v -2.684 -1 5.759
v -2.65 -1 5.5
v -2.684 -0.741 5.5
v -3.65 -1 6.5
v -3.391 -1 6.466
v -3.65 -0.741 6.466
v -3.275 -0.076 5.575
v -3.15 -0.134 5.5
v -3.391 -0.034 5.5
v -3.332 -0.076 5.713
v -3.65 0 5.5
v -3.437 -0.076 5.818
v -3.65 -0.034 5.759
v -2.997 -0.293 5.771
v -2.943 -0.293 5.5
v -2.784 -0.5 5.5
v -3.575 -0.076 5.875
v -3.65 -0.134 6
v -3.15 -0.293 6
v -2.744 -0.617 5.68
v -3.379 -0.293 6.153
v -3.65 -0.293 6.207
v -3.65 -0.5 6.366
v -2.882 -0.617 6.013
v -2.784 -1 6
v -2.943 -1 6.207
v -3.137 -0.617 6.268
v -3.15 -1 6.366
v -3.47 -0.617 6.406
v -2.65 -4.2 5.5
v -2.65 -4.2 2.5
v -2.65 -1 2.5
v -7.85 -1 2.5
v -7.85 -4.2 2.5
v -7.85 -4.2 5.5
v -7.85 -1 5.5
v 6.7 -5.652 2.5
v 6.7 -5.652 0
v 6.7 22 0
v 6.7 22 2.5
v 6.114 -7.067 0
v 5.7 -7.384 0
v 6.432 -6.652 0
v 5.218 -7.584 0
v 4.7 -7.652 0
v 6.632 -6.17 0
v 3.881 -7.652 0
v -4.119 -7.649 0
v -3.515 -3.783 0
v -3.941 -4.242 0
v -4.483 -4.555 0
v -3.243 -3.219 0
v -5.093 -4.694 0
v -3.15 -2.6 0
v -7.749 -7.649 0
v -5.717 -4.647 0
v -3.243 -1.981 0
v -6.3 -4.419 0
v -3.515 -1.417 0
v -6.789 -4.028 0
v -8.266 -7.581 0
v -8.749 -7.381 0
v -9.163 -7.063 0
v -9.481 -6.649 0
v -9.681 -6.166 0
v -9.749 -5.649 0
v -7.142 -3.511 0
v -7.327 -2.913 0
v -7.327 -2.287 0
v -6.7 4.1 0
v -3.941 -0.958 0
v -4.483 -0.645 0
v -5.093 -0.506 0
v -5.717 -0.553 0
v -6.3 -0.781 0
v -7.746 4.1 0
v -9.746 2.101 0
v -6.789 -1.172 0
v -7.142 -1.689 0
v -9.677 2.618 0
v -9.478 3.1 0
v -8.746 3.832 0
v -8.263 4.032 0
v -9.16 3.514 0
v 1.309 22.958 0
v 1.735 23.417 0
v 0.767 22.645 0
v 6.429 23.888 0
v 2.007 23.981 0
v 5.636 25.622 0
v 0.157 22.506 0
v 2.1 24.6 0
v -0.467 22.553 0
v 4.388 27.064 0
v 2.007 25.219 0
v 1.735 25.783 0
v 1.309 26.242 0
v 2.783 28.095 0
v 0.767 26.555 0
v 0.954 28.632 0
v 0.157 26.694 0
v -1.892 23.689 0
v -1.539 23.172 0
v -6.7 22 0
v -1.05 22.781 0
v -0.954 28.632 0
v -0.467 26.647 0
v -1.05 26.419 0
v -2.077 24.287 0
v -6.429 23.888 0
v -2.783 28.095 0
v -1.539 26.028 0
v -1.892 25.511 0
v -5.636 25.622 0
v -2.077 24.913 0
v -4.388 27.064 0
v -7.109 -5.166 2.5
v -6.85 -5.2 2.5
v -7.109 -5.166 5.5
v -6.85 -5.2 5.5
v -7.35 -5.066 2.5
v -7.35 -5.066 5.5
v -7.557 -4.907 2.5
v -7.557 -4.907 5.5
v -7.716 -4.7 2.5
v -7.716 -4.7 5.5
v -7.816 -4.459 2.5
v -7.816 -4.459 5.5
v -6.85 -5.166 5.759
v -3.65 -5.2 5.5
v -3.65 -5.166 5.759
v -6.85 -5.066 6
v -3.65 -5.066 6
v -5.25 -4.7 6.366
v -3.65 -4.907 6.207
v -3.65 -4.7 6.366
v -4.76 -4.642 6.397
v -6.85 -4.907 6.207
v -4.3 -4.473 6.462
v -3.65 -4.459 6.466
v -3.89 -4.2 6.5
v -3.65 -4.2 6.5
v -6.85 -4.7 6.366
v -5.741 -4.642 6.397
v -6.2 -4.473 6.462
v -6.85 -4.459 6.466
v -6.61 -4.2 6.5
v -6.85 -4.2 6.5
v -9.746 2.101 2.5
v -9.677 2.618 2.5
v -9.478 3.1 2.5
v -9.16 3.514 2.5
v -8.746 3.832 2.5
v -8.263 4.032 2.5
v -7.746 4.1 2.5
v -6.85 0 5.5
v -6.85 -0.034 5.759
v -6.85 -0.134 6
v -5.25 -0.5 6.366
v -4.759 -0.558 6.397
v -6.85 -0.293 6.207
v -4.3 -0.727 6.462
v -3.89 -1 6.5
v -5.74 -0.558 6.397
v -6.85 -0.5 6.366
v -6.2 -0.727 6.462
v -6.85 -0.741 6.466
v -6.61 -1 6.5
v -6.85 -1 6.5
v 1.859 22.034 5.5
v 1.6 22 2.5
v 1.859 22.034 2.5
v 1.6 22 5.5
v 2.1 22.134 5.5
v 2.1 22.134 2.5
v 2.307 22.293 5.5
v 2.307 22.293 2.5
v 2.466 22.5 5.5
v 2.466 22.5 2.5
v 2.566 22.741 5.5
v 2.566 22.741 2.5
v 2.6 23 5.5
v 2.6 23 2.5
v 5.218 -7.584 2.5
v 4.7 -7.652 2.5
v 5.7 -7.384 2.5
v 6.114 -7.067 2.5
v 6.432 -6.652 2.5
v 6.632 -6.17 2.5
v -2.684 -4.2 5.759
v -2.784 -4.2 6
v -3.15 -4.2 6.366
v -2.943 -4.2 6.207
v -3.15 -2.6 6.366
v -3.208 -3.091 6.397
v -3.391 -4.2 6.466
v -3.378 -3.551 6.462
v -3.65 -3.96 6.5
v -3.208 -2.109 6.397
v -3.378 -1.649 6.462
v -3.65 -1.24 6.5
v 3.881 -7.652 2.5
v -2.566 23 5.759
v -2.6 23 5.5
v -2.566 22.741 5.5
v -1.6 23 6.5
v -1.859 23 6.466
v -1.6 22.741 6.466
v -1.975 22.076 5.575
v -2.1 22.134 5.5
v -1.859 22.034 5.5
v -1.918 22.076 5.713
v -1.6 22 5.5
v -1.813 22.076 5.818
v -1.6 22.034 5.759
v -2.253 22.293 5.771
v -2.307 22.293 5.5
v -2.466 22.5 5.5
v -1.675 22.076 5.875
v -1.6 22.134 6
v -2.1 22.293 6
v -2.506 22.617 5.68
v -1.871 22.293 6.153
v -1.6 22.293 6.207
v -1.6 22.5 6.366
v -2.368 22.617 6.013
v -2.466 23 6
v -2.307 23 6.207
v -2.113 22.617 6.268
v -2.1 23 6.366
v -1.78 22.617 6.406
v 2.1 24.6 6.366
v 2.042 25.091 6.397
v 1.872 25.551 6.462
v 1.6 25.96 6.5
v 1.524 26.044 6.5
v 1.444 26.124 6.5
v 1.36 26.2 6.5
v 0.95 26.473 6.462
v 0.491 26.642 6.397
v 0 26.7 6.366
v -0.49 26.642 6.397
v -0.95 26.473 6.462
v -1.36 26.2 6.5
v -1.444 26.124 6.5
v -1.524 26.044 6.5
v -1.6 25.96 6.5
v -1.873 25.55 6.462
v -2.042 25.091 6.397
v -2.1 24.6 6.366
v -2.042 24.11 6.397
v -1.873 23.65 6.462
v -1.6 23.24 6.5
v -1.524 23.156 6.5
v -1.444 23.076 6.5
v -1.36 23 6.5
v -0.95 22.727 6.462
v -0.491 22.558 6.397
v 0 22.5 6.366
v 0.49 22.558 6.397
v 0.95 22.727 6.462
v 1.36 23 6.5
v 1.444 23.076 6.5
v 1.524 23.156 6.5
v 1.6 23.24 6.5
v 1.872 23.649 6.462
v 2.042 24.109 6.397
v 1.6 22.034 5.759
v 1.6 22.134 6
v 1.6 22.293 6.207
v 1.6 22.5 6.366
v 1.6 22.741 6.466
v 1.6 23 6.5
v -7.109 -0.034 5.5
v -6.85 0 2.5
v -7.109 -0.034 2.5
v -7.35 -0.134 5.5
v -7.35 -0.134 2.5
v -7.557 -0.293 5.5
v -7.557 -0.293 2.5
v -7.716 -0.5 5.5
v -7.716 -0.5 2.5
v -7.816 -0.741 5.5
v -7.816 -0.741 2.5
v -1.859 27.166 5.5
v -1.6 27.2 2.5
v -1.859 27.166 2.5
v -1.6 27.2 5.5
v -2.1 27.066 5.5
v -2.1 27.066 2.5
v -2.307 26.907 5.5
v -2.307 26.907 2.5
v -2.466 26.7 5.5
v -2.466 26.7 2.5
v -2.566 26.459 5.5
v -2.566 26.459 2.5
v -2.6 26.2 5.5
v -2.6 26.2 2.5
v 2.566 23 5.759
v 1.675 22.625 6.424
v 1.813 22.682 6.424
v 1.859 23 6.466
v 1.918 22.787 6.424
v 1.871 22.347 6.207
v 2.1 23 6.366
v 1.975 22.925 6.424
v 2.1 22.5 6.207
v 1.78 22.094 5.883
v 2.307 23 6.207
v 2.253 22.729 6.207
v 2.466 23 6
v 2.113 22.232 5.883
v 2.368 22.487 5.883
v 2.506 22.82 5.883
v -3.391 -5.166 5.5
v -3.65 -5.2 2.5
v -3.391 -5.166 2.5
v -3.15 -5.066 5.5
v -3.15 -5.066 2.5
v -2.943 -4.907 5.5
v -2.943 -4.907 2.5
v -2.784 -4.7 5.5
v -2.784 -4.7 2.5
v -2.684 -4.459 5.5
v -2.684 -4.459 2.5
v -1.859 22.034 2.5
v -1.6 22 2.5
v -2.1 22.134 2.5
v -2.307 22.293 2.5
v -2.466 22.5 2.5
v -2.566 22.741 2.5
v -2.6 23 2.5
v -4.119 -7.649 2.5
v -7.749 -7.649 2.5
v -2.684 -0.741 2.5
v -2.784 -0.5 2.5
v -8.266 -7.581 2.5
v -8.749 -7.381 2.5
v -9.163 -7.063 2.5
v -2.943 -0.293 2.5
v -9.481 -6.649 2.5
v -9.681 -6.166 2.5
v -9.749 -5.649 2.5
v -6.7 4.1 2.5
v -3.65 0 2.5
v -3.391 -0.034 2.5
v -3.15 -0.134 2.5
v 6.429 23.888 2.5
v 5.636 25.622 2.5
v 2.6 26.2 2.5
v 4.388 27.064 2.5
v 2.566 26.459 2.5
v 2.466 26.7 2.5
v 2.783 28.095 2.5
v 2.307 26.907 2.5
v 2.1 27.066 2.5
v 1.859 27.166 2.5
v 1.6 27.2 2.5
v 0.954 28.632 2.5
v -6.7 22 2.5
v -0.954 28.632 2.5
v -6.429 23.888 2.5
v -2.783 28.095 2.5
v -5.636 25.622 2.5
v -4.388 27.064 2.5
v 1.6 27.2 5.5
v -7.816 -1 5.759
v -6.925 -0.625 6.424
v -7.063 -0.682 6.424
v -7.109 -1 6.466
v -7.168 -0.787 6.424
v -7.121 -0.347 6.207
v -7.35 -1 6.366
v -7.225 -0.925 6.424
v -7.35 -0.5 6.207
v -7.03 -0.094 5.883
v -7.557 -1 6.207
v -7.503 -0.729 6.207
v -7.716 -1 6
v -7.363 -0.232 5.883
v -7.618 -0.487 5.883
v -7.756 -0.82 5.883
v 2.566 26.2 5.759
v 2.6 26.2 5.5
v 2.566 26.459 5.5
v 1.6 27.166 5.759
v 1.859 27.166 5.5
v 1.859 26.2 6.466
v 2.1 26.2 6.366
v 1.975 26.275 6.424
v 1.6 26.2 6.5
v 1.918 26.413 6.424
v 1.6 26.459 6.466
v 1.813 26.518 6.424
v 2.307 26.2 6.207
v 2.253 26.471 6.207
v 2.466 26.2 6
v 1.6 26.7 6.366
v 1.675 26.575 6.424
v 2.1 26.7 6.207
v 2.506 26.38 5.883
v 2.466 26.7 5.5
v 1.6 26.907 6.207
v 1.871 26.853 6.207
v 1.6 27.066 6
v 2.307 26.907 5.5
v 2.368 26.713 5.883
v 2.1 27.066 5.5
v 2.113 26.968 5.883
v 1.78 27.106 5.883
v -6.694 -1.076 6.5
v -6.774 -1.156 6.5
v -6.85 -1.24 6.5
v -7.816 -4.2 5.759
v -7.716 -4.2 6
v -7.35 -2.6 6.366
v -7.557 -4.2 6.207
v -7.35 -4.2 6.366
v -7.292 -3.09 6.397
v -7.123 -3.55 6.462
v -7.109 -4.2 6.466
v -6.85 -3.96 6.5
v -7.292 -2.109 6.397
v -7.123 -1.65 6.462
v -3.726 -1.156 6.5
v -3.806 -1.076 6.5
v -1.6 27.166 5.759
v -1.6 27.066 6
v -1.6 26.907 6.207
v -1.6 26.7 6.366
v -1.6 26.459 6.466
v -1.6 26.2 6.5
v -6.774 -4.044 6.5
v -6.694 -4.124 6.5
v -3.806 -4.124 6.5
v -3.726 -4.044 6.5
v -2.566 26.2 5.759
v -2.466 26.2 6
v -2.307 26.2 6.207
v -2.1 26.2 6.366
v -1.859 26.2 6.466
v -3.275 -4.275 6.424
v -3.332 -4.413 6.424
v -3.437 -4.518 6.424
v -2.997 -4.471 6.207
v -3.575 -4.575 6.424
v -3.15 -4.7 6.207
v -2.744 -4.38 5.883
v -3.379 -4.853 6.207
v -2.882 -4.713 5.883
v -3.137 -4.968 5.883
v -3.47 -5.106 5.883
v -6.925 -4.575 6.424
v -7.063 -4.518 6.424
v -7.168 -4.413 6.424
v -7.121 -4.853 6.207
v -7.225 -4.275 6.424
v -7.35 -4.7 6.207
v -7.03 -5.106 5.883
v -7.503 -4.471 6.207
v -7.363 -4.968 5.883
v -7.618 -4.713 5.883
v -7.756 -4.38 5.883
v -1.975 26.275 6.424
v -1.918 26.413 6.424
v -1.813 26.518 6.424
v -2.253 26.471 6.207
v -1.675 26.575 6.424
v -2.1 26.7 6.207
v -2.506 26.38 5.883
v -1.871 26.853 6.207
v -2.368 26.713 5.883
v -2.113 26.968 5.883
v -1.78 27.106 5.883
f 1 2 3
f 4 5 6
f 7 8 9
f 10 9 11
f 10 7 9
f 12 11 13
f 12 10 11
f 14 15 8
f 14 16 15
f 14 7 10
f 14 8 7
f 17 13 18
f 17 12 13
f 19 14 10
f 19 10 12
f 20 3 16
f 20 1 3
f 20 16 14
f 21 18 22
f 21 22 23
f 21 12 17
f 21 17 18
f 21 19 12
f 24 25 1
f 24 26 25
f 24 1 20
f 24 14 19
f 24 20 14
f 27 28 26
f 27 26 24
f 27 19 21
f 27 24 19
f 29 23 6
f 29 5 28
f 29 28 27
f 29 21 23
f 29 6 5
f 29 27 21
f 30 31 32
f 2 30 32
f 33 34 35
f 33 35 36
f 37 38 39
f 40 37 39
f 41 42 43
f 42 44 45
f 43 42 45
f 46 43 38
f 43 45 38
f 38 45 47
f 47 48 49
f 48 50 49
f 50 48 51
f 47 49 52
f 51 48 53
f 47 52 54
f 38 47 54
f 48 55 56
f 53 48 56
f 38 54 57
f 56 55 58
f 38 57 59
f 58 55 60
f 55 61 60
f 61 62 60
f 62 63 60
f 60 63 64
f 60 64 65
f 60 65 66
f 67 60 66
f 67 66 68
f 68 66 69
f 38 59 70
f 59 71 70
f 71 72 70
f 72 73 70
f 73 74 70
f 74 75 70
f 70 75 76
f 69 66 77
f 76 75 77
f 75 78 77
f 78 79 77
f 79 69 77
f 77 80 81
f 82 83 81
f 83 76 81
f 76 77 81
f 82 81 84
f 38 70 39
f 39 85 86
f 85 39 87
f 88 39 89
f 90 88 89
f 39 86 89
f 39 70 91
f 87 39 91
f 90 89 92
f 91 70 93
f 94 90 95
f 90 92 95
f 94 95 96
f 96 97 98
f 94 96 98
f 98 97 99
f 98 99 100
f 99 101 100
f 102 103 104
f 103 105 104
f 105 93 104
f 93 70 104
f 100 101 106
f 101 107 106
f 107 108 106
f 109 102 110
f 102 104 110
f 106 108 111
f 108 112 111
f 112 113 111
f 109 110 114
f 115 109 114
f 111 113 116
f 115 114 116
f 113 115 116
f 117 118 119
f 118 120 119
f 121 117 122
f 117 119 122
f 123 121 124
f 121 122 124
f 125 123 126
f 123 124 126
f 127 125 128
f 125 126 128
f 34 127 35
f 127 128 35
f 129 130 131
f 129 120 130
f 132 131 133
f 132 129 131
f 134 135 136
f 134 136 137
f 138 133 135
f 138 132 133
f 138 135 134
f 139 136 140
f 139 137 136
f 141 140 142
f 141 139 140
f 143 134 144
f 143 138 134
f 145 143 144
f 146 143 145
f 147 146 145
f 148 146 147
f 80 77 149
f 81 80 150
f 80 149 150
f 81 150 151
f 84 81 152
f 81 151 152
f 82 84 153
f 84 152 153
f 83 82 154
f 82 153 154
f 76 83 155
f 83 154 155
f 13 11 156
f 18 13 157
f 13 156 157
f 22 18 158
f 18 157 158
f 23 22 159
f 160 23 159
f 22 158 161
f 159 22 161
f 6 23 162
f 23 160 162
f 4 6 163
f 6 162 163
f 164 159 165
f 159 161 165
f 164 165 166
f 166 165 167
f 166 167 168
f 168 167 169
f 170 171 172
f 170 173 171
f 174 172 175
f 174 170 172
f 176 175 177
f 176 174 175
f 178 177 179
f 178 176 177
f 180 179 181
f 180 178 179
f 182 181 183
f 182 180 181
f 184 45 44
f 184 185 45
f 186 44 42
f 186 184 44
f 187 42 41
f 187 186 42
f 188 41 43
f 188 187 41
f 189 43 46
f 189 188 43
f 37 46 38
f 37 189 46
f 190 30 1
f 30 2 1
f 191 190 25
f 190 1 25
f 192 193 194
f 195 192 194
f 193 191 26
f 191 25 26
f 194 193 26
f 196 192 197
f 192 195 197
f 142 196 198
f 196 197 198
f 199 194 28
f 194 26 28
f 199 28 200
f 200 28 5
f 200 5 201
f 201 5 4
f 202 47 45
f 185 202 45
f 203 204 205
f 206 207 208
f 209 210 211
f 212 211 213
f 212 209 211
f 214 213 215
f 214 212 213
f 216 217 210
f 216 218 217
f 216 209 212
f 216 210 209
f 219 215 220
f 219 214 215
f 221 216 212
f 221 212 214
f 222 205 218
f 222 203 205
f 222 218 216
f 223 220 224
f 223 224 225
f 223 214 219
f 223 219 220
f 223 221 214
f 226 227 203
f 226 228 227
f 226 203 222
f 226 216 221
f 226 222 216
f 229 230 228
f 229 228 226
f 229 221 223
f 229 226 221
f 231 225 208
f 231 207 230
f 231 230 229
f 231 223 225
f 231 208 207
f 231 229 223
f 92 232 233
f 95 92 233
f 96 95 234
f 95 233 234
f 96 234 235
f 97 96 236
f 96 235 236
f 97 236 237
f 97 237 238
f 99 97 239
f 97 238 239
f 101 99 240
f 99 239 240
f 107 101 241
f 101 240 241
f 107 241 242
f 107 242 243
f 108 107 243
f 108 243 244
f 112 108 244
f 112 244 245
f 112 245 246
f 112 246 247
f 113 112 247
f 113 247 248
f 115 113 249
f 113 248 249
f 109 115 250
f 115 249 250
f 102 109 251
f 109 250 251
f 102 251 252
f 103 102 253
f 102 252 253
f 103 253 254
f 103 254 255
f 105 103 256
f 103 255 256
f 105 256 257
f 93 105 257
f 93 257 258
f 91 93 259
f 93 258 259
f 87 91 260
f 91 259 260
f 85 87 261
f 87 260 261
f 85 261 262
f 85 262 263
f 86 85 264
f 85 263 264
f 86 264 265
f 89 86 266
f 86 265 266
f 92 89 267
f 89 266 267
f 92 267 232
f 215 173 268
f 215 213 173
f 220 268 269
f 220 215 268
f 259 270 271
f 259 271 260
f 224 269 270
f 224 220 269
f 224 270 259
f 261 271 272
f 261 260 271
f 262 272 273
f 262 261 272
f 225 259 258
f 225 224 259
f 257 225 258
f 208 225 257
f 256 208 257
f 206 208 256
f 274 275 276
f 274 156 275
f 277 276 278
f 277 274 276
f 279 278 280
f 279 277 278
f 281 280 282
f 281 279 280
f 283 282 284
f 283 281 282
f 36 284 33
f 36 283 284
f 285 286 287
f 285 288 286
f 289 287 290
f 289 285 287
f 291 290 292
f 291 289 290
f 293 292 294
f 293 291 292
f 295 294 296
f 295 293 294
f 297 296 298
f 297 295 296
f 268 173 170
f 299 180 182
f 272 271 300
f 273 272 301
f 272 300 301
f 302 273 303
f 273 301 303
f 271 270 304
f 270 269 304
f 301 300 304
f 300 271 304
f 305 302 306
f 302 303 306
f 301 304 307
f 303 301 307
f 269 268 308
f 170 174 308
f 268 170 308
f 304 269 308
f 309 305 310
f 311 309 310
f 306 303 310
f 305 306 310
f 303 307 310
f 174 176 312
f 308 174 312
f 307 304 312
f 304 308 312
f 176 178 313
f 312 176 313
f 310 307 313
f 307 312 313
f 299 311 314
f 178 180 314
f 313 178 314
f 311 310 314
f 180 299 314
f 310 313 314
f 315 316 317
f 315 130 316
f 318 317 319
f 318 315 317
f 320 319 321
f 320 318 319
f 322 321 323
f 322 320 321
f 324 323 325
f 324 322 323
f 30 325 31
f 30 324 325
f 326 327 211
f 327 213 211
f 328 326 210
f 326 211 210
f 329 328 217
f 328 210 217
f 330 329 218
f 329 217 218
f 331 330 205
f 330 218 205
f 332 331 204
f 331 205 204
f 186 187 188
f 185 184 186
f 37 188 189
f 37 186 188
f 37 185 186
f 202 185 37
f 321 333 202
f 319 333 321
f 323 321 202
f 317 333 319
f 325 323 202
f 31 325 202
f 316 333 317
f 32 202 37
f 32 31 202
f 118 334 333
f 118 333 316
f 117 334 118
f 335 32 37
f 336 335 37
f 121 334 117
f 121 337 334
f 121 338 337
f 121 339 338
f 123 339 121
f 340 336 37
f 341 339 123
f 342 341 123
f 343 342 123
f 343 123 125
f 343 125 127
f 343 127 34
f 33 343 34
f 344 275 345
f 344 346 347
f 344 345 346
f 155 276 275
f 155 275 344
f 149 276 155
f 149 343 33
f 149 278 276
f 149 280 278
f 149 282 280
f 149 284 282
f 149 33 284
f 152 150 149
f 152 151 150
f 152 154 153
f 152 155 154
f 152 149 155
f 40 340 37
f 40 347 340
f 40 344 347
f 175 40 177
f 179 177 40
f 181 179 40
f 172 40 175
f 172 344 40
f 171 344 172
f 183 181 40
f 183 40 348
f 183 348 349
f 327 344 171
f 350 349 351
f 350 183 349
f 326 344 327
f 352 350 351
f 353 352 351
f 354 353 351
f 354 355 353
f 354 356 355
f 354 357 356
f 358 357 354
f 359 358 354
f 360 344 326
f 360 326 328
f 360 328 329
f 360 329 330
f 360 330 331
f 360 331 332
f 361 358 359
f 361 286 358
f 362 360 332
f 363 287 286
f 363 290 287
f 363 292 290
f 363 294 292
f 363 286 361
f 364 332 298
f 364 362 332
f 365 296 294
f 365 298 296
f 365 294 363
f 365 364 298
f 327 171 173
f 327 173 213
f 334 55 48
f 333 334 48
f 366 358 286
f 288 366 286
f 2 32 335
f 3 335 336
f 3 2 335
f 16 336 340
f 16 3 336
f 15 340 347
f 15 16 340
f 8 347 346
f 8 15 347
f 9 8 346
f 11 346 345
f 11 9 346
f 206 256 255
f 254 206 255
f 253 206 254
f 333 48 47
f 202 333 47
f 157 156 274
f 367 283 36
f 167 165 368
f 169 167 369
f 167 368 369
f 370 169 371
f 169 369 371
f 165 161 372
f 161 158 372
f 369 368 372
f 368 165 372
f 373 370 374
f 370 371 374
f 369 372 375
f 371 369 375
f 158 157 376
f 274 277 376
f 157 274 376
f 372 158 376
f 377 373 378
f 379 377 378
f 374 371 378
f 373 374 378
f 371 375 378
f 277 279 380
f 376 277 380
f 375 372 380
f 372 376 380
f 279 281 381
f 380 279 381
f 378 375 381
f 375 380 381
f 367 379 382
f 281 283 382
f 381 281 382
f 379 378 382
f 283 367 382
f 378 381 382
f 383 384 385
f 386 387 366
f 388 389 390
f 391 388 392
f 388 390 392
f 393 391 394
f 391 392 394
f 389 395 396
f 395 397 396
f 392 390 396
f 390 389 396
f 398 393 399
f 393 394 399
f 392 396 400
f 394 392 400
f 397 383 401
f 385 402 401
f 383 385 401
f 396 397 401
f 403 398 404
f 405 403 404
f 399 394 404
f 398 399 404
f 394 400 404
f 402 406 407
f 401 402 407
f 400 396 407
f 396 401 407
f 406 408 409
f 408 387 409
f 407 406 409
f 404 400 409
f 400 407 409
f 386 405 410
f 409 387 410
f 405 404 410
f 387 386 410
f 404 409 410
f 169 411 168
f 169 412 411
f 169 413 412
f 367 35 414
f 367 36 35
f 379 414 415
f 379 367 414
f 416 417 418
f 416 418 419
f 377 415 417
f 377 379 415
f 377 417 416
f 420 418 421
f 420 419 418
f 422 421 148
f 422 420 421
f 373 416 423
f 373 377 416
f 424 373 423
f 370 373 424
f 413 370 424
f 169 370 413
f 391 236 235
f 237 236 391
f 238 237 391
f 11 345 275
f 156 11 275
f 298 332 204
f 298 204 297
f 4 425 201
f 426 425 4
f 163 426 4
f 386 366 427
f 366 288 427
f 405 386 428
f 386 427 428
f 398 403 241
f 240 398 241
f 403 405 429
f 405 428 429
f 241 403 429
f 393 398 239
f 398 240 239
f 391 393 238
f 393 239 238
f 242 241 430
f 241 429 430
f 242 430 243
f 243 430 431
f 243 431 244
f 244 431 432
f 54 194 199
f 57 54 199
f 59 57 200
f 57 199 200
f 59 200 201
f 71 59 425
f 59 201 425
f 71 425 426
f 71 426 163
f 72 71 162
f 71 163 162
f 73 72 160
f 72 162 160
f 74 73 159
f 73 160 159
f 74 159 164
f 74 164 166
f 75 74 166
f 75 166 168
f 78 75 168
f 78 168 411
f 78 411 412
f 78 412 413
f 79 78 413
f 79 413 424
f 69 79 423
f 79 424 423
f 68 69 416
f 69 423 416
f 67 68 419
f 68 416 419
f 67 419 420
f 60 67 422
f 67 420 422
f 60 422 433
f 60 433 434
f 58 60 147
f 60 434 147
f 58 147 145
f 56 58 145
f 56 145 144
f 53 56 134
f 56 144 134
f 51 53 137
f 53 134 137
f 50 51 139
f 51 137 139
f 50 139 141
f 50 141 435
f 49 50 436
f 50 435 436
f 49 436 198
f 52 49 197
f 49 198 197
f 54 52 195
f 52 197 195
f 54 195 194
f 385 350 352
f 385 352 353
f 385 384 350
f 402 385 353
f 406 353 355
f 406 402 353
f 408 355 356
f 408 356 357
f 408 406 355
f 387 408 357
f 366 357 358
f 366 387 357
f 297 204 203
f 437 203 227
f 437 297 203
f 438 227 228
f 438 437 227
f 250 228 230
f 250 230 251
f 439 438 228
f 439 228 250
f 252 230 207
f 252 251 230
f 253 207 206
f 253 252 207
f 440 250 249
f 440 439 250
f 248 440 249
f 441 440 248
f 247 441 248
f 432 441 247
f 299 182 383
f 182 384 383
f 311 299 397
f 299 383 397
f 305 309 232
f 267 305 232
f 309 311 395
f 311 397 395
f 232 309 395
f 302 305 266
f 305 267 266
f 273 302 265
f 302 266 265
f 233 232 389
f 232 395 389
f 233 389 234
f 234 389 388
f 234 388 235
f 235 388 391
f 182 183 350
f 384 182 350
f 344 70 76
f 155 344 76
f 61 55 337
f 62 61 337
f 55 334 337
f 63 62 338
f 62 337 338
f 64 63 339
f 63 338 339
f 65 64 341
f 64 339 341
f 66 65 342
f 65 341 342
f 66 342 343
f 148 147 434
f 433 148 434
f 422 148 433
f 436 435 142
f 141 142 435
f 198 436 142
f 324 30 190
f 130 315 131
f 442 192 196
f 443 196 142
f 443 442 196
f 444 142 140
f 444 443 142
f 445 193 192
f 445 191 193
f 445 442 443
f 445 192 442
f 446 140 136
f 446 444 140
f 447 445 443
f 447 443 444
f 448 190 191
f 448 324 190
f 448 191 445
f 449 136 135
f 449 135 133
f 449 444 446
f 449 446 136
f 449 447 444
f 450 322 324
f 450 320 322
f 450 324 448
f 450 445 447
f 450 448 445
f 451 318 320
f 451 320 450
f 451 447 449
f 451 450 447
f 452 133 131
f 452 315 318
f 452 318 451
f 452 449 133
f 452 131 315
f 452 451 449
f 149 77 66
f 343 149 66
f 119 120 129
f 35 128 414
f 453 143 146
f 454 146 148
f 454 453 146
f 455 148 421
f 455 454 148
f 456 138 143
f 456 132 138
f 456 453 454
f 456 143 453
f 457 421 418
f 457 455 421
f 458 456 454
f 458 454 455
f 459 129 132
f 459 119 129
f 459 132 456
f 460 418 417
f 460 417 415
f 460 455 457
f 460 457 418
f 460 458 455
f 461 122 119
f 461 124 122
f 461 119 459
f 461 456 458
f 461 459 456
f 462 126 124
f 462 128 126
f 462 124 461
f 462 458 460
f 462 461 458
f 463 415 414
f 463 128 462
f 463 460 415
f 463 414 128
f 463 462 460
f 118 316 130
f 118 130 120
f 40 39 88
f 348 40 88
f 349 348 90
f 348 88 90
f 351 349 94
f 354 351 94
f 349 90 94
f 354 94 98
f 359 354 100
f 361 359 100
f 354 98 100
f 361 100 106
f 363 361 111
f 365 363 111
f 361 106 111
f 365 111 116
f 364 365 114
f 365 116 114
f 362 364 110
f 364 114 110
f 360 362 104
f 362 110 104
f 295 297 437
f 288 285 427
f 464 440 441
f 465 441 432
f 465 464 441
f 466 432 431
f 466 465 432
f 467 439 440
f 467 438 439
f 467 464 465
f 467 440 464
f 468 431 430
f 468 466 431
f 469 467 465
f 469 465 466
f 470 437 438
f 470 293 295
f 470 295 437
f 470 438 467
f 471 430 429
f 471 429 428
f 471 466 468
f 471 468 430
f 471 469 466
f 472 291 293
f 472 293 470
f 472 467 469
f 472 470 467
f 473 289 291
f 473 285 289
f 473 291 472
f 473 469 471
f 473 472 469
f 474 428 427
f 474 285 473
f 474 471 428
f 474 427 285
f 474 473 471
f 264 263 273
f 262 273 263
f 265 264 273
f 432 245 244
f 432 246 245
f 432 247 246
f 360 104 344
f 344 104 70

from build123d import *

# Parameters (mm, degrees)
BOSS_EXTRUDE1_DEPTH = 2.5
SKETCH1_3_W         = 5.2
SKETCH1_3_H         = 5.2
BOSS_EXTRUDE2_DEPTH = 6.5
FILLET1_R           = 2
FILLET2_R           = 1
SKETCH2_R           = 2.1
CUT_EXTRUDE1_DEPTH  = 7.5


with BuildPart() as part:
    # Sketch1 → Boss-Extrude1 (new body)
    with BuildSketch(Plane(origin=(0, 0, 0), x_dir=(0, 1, 0), z_dir=(0, 0, 1))):
        with BuildLine():
            Line((-7.649421348, 9.749384529), (-7.649421348, 4.119353309))
            Line((-7.649421348, 4.119353309), (-7.652407104, -3.880646133))
            Line((-7.652407104, -3.880646133), (-7.652407104, -6.7))
            Line((-7.652407104, -6.7), (22, -6.7))
            ThreePointArc((22, -6.7), (28.7, 0), (22, 6.7))
            Line((22, 6.7), (4.1, 6.7))
            Line((4.1, 6.7), (4.1, 9.744999415))
            Line((4.1, 9.744999415), (-7.649421348, 9.749384529))
        make_face()
    extrude(amount=BOSS_EXTRUDE1_DEPTH)

    # Sketch1<3> → Boss-Extrude2 (add)
    with BuildSketch(Plane(origin=(0, 0, 0), x_dir=(0, 1, 0), z_dir=(0, 0, 1))):
        with Locations((24.6, 0)):
            Rectangle(SKETCH1_3_W, SKETCH1_3_H)
        with Locations((-2.6, 5.25)):
            Rectangle(SKETCH1_3_W, SKETCH1_3_H)
    extrude(amount=BOSS_EXTRUDE2_DEPTH)

    # Fillet1
    fillet1_edges = [part.edges().sort_by_distance(p)[0] for p in [
        (6.7, -7.652407104, 1.25),
        (-9.749384529, -7.649421348, 1.25),
        (-9.744999415, 4.1, 1.25),
    ]]
    fillet(fillet1_edges, radius=FILLET1_R)

    # Fillet2
    fillet2_edges = [part.edges().sort_by_distance(p)[0] for p in [
        (-2.65, -5.2, 4.5),
        (-2.65, -2.6, 6.5),
        (-2.65, 0, 4.5),
        (-7.85, 0, 4.5),
        (-7.85, -5.2, 4.5),
        (-5.25, -5.2, 6.5),
        (-5.25, 0, 6.5),
        (-7.85, -2.6, 6.5),
        (2.6, 22, 4.5),
        (2.6, 27.2, 4.5),
        (-2.6, 27.2, 4.5),
        (-2.6, 24.6, 6.5),
        (-2.6, 22, 4.5),
        (0, 22, 6.5),
        (2.6, 24.6, 6.5),
        (0, 27.2, 6.5),
    ]]
    fillet(fillet2_edges, radius=FILLET2_R)

    # Sketch2 → Cut-Extrude1 (cut)
    with BuildSketch(Plane.XY.offset(6.5)):
        with Locations((-5.25, -2.6)):
            Circle(SKETCH2_R)
        with Locations((0, 24.6)):
            Circle(SKETCH2_R)
    extrude(amount=-CUT_EXTRUDE1_DEPTH, mode=Mode.SUBTRACT)


solid = part.part
